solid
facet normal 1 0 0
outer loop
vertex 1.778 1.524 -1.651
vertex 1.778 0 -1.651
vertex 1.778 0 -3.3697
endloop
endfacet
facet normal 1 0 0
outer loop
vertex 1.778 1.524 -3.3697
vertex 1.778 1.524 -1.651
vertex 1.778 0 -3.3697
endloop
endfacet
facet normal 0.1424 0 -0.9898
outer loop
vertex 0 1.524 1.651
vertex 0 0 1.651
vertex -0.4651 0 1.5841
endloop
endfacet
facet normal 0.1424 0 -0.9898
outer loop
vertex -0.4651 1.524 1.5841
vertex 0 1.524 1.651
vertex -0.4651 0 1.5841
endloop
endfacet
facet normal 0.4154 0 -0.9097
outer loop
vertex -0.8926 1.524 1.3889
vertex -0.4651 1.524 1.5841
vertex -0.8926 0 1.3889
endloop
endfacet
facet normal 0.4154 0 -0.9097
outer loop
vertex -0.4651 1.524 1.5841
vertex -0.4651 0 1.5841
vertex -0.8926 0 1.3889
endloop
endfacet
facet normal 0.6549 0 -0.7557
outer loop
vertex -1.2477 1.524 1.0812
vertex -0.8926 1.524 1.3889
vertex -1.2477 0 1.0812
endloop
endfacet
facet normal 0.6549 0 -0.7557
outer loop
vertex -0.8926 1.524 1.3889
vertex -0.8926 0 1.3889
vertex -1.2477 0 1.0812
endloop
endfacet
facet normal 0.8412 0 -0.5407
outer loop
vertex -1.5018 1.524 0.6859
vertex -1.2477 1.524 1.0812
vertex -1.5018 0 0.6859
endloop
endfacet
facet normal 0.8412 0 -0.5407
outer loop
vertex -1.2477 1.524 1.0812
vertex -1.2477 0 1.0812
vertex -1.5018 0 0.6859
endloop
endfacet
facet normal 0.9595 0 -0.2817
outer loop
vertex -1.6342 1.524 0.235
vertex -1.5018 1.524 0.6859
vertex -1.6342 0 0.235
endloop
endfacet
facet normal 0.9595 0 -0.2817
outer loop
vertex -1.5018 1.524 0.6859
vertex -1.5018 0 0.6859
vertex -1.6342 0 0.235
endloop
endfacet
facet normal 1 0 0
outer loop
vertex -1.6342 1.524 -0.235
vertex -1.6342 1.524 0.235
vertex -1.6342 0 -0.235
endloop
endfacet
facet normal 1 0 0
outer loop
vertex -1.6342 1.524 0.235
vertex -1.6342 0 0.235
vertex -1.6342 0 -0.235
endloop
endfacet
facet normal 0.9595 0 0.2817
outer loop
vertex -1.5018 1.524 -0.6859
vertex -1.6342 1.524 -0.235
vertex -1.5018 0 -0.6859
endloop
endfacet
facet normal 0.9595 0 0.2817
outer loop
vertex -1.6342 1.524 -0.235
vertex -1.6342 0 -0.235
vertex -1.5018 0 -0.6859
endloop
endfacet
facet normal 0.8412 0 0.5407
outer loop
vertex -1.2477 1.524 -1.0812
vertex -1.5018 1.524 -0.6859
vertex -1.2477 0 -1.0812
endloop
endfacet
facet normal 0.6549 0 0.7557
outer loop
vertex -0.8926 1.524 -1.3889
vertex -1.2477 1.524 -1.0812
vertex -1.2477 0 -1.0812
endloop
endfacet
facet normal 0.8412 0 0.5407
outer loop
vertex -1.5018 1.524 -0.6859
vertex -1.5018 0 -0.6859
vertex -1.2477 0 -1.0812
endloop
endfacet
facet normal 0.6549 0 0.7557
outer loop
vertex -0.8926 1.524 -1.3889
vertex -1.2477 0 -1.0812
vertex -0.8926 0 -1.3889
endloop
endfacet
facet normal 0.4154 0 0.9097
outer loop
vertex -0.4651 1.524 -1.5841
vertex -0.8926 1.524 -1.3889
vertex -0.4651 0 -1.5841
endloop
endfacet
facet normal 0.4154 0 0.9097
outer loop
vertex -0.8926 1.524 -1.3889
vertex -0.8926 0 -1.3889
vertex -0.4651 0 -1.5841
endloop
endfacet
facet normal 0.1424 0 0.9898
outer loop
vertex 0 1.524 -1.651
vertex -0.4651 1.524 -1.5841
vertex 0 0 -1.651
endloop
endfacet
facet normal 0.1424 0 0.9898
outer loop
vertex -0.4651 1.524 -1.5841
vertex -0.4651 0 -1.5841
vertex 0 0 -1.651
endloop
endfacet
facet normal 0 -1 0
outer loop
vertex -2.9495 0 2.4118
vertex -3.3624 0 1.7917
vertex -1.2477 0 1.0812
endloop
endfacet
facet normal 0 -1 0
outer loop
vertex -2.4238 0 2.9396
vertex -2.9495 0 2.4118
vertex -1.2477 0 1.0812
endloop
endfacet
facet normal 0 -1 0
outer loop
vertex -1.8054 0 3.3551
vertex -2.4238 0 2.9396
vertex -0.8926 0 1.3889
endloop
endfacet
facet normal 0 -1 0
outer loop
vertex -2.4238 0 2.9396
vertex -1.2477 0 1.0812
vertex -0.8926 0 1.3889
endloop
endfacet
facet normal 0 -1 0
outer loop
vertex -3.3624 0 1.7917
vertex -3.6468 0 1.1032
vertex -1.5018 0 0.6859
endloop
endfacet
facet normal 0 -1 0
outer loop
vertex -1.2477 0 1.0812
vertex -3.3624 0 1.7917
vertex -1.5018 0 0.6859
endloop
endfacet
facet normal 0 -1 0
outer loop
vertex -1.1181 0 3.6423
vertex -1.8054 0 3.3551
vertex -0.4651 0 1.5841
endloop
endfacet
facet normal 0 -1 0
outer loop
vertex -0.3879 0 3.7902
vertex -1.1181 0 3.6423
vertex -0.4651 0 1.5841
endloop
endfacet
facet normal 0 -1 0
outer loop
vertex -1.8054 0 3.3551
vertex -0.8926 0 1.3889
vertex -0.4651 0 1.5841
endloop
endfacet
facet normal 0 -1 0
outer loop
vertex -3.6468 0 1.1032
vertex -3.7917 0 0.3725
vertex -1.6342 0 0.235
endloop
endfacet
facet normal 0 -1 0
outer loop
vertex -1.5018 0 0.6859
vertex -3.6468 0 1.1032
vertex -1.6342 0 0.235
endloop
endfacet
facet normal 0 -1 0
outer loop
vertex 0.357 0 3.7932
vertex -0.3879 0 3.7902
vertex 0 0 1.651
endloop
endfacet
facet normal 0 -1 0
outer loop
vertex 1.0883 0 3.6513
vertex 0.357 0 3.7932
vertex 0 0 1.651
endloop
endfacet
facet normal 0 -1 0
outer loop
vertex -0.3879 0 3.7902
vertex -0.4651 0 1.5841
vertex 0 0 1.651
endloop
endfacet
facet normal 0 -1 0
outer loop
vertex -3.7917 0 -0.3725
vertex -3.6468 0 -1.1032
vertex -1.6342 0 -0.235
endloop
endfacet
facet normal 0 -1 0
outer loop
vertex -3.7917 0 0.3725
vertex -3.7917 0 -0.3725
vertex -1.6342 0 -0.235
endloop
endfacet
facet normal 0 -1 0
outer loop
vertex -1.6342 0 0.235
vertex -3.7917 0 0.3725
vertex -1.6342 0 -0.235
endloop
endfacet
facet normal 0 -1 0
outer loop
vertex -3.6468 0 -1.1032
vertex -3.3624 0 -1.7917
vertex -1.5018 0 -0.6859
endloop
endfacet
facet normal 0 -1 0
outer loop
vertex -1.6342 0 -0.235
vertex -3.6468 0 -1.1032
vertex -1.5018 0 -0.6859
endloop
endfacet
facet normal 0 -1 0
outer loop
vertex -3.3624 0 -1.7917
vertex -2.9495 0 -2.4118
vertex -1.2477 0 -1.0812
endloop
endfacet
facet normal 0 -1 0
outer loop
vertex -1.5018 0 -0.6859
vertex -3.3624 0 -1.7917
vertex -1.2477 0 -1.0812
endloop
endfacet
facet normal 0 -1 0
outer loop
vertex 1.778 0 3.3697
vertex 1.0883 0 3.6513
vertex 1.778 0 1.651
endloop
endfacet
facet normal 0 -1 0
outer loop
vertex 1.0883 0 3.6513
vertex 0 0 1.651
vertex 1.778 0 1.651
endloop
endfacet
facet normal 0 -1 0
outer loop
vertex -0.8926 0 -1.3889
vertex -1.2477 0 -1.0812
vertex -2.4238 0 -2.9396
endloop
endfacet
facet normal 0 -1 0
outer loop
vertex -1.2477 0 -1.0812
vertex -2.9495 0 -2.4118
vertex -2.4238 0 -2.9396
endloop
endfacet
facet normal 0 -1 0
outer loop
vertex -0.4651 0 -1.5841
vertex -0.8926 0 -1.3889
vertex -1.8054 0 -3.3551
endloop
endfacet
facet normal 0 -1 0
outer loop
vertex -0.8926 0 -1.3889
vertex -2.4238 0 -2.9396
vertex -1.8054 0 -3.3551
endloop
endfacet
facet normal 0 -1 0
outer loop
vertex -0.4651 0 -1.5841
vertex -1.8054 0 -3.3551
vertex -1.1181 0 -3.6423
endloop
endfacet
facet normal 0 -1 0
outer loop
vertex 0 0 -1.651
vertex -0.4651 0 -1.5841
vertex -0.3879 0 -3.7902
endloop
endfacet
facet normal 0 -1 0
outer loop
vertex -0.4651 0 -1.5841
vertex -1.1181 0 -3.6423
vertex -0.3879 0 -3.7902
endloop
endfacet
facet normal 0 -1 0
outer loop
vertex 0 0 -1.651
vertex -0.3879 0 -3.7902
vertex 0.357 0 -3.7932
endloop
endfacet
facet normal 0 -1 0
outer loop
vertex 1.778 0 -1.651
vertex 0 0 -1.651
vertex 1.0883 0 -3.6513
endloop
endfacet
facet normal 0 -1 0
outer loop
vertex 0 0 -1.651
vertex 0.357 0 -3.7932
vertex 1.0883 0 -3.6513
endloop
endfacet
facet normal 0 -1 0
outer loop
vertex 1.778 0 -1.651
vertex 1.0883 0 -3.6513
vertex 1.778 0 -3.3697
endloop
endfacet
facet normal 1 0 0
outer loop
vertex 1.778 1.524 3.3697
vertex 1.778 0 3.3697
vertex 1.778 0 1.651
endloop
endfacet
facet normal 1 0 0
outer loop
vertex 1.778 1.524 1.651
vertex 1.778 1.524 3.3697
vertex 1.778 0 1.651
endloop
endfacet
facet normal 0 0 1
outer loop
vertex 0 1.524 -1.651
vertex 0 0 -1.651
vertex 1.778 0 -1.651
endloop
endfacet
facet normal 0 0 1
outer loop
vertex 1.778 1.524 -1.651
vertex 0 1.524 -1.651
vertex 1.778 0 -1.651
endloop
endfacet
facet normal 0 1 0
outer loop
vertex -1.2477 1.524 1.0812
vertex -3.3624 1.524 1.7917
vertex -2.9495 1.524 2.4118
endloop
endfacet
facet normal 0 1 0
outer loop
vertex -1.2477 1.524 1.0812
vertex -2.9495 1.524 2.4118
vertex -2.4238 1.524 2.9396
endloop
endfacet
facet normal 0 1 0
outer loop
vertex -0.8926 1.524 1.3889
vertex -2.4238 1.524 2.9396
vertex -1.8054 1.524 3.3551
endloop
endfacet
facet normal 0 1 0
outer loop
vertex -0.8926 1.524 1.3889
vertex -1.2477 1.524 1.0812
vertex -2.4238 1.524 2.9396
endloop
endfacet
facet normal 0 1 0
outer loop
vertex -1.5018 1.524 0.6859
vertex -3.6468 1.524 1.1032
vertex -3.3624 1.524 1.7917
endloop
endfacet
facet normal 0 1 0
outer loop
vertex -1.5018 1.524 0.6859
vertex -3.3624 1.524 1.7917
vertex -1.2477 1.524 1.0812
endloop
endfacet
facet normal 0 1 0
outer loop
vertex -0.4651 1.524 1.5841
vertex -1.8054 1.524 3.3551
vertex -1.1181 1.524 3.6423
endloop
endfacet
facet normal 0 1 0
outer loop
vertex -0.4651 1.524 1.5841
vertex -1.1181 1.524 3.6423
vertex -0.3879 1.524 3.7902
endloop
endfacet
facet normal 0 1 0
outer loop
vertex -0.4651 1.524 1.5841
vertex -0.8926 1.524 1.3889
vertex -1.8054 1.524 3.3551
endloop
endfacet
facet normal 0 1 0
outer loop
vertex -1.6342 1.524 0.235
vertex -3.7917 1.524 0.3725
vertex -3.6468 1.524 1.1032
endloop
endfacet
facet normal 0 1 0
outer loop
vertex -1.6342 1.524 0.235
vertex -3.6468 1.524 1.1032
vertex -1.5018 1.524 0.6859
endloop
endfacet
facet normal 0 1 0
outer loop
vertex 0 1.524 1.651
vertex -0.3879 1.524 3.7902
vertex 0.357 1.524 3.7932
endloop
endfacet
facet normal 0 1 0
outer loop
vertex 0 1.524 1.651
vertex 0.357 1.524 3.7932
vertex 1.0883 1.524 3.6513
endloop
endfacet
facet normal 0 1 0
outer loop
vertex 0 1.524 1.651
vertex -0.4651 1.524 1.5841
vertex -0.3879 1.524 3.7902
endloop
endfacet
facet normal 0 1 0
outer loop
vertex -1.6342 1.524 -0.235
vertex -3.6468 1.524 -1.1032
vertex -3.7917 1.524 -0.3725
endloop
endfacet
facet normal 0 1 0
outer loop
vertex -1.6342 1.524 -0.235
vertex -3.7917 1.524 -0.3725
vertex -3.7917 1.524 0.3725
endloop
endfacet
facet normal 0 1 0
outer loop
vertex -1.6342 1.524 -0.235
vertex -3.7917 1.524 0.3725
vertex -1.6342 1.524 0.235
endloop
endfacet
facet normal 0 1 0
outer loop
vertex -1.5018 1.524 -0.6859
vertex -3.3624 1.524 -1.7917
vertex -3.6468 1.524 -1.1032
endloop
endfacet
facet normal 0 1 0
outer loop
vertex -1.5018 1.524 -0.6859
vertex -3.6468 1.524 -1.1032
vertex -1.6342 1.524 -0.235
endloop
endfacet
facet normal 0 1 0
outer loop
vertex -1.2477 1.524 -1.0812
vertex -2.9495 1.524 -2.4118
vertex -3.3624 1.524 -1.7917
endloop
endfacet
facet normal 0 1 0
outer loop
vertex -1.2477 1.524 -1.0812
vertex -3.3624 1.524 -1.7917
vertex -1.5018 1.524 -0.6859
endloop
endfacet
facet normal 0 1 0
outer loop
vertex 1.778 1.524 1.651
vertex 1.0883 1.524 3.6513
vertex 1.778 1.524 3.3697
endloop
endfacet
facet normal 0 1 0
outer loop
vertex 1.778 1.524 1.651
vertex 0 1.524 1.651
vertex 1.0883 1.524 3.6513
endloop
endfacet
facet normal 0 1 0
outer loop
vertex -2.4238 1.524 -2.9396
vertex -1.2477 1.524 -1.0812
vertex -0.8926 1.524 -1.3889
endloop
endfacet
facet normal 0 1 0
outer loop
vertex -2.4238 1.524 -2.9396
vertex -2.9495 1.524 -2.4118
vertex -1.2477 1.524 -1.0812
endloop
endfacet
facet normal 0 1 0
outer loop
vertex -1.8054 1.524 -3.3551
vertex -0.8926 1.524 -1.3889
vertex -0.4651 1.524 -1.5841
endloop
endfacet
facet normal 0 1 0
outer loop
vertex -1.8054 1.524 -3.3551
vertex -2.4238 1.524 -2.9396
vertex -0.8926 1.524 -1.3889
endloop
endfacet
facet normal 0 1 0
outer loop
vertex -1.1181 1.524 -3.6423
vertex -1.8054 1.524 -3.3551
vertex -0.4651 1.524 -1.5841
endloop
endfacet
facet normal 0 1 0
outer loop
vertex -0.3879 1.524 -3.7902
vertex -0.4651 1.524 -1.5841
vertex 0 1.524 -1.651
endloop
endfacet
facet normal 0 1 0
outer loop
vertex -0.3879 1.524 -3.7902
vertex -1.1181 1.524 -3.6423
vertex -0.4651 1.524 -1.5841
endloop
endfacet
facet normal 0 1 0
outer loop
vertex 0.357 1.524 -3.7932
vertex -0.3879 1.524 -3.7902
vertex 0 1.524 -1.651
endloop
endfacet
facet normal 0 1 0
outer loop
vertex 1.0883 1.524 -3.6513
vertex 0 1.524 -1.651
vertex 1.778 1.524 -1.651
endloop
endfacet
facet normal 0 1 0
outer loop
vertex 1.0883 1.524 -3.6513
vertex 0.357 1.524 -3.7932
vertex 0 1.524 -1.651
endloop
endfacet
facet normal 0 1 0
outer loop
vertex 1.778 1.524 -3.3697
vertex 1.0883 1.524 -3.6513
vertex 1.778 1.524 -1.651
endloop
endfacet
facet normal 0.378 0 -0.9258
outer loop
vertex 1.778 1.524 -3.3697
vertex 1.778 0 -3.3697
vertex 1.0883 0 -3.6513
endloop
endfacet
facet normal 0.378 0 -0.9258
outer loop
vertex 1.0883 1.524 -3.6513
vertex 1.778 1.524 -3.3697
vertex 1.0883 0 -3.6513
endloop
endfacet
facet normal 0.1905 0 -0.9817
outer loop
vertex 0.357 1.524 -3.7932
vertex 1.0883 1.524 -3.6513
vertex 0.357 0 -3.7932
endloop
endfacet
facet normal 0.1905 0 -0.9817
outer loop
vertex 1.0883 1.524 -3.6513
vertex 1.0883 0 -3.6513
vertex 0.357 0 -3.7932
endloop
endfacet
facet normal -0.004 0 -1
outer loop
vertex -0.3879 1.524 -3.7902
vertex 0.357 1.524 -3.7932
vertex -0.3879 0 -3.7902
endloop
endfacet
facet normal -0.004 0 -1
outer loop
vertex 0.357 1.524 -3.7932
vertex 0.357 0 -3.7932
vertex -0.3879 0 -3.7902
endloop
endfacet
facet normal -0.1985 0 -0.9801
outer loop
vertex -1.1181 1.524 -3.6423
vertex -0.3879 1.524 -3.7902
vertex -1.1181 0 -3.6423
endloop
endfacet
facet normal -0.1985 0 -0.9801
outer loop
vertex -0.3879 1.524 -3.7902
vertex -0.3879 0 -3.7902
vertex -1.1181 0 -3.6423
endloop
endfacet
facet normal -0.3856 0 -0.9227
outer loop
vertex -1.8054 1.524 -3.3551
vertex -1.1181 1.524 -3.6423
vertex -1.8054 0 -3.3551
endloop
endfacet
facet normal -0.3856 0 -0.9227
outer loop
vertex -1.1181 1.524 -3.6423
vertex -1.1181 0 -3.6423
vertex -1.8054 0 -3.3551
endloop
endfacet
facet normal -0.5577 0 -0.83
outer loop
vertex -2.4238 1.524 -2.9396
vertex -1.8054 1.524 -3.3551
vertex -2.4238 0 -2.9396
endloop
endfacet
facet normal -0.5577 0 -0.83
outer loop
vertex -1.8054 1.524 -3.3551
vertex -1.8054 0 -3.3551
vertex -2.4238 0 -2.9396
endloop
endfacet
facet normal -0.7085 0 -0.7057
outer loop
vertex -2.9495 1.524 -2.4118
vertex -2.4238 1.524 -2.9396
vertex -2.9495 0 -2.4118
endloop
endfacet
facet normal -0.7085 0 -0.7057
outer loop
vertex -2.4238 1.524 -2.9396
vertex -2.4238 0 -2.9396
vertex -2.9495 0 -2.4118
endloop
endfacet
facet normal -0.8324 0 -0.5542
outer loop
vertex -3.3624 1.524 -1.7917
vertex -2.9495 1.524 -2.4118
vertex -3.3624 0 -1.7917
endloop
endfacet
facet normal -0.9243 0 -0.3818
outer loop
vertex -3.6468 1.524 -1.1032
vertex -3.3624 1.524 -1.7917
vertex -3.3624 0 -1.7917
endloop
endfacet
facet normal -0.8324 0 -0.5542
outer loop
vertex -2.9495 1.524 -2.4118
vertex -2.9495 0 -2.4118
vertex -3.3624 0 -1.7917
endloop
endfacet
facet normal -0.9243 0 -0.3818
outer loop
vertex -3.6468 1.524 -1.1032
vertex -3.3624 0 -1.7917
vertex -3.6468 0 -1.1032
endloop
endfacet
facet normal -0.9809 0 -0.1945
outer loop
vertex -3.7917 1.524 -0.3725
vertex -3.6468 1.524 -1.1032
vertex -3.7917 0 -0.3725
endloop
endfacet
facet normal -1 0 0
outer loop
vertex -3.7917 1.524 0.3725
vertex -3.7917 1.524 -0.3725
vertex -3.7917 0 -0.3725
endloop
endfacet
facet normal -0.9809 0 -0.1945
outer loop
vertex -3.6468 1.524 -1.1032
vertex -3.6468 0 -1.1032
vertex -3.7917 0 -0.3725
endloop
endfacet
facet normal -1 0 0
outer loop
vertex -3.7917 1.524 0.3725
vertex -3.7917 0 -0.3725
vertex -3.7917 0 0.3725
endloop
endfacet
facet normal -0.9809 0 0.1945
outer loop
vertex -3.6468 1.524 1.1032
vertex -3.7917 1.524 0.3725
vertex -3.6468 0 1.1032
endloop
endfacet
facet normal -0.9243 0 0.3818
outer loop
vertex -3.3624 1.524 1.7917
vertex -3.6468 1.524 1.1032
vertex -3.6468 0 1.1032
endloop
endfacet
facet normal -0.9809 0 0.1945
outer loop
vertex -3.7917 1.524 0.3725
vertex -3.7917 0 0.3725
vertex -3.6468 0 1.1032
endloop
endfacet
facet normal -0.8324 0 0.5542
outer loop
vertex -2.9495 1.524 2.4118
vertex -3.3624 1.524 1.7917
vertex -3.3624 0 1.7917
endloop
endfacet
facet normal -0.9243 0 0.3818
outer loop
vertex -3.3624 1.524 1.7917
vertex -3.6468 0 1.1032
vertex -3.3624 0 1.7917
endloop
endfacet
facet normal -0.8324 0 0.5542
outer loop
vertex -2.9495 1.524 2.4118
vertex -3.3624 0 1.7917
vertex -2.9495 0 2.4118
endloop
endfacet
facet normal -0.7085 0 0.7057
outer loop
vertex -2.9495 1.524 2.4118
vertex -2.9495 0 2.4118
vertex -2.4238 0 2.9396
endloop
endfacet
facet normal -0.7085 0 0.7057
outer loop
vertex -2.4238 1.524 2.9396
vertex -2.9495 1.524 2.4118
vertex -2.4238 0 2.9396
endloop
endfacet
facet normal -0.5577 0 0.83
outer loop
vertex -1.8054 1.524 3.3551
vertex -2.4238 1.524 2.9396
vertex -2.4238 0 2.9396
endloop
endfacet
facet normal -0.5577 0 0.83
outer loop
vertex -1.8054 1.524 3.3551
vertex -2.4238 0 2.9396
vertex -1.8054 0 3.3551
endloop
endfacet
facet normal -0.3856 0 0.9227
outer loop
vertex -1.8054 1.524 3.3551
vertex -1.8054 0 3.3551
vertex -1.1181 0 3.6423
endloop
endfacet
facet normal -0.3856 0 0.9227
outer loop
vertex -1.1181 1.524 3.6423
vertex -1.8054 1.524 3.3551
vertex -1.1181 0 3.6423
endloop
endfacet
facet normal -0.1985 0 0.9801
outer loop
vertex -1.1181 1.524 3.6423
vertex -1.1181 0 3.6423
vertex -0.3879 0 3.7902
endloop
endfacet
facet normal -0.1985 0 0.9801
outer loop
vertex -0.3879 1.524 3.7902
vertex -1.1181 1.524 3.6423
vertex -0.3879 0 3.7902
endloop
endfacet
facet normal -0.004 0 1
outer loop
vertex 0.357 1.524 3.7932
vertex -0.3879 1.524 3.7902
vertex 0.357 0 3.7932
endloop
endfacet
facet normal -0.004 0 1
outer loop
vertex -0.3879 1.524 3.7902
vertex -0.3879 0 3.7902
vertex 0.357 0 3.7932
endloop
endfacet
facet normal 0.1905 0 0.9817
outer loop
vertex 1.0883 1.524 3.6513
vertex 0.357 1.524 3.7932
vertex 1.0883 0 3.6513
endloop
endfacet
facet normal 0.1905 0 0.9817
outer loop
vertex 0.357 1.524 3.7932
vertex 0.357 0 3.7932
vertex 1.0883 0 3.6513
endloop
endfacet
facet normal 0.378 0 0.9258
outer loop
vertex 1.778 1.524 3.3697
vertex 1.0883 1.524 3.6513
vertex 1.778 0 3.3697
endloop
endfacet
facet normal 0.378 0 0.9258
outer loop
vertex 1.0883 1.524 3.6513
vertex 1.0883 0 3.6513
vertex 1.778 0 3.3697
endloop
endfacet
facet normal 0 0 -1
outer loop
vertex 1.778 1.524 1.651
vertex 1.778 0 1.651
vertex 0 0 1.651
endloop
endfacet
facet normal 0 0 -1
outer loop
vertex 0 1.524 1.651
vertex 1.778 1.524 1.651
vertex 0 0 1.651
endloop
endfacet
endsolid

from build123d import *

# Parameters (mm, degrees)
BOSS_EXTRUDE1_DEPTH = 1.524


with BuildPart() as part:
    # Sketch1 → Boss-Extrude1 (new body)
    with BuildSketch(Plane(origin=(0, 0, 0), x_dir=(1, 0, 0), z_dir=(0, 1, 0))):
        with BuildLine():
            Line((0, 1.651), (1.778, 1.651))
            Line((1.778, 1.651), (1.778, 3.369690787))
            ThreePointArc((1.778, 3.369690787), (-3.81, 0), (1.778, -3.369690787))
            Line((1.778, -3.369690787), (1.778, -1.651))
            Line((1.778, -1.651), (0, -1.651))
            ThreePointArc((0, -1.651), (-1.651, 0), (0, 1.651))
        make_face()
    extrude(amount=BOSS_EXTRUDE1_DEPTH)


solid = part.part
